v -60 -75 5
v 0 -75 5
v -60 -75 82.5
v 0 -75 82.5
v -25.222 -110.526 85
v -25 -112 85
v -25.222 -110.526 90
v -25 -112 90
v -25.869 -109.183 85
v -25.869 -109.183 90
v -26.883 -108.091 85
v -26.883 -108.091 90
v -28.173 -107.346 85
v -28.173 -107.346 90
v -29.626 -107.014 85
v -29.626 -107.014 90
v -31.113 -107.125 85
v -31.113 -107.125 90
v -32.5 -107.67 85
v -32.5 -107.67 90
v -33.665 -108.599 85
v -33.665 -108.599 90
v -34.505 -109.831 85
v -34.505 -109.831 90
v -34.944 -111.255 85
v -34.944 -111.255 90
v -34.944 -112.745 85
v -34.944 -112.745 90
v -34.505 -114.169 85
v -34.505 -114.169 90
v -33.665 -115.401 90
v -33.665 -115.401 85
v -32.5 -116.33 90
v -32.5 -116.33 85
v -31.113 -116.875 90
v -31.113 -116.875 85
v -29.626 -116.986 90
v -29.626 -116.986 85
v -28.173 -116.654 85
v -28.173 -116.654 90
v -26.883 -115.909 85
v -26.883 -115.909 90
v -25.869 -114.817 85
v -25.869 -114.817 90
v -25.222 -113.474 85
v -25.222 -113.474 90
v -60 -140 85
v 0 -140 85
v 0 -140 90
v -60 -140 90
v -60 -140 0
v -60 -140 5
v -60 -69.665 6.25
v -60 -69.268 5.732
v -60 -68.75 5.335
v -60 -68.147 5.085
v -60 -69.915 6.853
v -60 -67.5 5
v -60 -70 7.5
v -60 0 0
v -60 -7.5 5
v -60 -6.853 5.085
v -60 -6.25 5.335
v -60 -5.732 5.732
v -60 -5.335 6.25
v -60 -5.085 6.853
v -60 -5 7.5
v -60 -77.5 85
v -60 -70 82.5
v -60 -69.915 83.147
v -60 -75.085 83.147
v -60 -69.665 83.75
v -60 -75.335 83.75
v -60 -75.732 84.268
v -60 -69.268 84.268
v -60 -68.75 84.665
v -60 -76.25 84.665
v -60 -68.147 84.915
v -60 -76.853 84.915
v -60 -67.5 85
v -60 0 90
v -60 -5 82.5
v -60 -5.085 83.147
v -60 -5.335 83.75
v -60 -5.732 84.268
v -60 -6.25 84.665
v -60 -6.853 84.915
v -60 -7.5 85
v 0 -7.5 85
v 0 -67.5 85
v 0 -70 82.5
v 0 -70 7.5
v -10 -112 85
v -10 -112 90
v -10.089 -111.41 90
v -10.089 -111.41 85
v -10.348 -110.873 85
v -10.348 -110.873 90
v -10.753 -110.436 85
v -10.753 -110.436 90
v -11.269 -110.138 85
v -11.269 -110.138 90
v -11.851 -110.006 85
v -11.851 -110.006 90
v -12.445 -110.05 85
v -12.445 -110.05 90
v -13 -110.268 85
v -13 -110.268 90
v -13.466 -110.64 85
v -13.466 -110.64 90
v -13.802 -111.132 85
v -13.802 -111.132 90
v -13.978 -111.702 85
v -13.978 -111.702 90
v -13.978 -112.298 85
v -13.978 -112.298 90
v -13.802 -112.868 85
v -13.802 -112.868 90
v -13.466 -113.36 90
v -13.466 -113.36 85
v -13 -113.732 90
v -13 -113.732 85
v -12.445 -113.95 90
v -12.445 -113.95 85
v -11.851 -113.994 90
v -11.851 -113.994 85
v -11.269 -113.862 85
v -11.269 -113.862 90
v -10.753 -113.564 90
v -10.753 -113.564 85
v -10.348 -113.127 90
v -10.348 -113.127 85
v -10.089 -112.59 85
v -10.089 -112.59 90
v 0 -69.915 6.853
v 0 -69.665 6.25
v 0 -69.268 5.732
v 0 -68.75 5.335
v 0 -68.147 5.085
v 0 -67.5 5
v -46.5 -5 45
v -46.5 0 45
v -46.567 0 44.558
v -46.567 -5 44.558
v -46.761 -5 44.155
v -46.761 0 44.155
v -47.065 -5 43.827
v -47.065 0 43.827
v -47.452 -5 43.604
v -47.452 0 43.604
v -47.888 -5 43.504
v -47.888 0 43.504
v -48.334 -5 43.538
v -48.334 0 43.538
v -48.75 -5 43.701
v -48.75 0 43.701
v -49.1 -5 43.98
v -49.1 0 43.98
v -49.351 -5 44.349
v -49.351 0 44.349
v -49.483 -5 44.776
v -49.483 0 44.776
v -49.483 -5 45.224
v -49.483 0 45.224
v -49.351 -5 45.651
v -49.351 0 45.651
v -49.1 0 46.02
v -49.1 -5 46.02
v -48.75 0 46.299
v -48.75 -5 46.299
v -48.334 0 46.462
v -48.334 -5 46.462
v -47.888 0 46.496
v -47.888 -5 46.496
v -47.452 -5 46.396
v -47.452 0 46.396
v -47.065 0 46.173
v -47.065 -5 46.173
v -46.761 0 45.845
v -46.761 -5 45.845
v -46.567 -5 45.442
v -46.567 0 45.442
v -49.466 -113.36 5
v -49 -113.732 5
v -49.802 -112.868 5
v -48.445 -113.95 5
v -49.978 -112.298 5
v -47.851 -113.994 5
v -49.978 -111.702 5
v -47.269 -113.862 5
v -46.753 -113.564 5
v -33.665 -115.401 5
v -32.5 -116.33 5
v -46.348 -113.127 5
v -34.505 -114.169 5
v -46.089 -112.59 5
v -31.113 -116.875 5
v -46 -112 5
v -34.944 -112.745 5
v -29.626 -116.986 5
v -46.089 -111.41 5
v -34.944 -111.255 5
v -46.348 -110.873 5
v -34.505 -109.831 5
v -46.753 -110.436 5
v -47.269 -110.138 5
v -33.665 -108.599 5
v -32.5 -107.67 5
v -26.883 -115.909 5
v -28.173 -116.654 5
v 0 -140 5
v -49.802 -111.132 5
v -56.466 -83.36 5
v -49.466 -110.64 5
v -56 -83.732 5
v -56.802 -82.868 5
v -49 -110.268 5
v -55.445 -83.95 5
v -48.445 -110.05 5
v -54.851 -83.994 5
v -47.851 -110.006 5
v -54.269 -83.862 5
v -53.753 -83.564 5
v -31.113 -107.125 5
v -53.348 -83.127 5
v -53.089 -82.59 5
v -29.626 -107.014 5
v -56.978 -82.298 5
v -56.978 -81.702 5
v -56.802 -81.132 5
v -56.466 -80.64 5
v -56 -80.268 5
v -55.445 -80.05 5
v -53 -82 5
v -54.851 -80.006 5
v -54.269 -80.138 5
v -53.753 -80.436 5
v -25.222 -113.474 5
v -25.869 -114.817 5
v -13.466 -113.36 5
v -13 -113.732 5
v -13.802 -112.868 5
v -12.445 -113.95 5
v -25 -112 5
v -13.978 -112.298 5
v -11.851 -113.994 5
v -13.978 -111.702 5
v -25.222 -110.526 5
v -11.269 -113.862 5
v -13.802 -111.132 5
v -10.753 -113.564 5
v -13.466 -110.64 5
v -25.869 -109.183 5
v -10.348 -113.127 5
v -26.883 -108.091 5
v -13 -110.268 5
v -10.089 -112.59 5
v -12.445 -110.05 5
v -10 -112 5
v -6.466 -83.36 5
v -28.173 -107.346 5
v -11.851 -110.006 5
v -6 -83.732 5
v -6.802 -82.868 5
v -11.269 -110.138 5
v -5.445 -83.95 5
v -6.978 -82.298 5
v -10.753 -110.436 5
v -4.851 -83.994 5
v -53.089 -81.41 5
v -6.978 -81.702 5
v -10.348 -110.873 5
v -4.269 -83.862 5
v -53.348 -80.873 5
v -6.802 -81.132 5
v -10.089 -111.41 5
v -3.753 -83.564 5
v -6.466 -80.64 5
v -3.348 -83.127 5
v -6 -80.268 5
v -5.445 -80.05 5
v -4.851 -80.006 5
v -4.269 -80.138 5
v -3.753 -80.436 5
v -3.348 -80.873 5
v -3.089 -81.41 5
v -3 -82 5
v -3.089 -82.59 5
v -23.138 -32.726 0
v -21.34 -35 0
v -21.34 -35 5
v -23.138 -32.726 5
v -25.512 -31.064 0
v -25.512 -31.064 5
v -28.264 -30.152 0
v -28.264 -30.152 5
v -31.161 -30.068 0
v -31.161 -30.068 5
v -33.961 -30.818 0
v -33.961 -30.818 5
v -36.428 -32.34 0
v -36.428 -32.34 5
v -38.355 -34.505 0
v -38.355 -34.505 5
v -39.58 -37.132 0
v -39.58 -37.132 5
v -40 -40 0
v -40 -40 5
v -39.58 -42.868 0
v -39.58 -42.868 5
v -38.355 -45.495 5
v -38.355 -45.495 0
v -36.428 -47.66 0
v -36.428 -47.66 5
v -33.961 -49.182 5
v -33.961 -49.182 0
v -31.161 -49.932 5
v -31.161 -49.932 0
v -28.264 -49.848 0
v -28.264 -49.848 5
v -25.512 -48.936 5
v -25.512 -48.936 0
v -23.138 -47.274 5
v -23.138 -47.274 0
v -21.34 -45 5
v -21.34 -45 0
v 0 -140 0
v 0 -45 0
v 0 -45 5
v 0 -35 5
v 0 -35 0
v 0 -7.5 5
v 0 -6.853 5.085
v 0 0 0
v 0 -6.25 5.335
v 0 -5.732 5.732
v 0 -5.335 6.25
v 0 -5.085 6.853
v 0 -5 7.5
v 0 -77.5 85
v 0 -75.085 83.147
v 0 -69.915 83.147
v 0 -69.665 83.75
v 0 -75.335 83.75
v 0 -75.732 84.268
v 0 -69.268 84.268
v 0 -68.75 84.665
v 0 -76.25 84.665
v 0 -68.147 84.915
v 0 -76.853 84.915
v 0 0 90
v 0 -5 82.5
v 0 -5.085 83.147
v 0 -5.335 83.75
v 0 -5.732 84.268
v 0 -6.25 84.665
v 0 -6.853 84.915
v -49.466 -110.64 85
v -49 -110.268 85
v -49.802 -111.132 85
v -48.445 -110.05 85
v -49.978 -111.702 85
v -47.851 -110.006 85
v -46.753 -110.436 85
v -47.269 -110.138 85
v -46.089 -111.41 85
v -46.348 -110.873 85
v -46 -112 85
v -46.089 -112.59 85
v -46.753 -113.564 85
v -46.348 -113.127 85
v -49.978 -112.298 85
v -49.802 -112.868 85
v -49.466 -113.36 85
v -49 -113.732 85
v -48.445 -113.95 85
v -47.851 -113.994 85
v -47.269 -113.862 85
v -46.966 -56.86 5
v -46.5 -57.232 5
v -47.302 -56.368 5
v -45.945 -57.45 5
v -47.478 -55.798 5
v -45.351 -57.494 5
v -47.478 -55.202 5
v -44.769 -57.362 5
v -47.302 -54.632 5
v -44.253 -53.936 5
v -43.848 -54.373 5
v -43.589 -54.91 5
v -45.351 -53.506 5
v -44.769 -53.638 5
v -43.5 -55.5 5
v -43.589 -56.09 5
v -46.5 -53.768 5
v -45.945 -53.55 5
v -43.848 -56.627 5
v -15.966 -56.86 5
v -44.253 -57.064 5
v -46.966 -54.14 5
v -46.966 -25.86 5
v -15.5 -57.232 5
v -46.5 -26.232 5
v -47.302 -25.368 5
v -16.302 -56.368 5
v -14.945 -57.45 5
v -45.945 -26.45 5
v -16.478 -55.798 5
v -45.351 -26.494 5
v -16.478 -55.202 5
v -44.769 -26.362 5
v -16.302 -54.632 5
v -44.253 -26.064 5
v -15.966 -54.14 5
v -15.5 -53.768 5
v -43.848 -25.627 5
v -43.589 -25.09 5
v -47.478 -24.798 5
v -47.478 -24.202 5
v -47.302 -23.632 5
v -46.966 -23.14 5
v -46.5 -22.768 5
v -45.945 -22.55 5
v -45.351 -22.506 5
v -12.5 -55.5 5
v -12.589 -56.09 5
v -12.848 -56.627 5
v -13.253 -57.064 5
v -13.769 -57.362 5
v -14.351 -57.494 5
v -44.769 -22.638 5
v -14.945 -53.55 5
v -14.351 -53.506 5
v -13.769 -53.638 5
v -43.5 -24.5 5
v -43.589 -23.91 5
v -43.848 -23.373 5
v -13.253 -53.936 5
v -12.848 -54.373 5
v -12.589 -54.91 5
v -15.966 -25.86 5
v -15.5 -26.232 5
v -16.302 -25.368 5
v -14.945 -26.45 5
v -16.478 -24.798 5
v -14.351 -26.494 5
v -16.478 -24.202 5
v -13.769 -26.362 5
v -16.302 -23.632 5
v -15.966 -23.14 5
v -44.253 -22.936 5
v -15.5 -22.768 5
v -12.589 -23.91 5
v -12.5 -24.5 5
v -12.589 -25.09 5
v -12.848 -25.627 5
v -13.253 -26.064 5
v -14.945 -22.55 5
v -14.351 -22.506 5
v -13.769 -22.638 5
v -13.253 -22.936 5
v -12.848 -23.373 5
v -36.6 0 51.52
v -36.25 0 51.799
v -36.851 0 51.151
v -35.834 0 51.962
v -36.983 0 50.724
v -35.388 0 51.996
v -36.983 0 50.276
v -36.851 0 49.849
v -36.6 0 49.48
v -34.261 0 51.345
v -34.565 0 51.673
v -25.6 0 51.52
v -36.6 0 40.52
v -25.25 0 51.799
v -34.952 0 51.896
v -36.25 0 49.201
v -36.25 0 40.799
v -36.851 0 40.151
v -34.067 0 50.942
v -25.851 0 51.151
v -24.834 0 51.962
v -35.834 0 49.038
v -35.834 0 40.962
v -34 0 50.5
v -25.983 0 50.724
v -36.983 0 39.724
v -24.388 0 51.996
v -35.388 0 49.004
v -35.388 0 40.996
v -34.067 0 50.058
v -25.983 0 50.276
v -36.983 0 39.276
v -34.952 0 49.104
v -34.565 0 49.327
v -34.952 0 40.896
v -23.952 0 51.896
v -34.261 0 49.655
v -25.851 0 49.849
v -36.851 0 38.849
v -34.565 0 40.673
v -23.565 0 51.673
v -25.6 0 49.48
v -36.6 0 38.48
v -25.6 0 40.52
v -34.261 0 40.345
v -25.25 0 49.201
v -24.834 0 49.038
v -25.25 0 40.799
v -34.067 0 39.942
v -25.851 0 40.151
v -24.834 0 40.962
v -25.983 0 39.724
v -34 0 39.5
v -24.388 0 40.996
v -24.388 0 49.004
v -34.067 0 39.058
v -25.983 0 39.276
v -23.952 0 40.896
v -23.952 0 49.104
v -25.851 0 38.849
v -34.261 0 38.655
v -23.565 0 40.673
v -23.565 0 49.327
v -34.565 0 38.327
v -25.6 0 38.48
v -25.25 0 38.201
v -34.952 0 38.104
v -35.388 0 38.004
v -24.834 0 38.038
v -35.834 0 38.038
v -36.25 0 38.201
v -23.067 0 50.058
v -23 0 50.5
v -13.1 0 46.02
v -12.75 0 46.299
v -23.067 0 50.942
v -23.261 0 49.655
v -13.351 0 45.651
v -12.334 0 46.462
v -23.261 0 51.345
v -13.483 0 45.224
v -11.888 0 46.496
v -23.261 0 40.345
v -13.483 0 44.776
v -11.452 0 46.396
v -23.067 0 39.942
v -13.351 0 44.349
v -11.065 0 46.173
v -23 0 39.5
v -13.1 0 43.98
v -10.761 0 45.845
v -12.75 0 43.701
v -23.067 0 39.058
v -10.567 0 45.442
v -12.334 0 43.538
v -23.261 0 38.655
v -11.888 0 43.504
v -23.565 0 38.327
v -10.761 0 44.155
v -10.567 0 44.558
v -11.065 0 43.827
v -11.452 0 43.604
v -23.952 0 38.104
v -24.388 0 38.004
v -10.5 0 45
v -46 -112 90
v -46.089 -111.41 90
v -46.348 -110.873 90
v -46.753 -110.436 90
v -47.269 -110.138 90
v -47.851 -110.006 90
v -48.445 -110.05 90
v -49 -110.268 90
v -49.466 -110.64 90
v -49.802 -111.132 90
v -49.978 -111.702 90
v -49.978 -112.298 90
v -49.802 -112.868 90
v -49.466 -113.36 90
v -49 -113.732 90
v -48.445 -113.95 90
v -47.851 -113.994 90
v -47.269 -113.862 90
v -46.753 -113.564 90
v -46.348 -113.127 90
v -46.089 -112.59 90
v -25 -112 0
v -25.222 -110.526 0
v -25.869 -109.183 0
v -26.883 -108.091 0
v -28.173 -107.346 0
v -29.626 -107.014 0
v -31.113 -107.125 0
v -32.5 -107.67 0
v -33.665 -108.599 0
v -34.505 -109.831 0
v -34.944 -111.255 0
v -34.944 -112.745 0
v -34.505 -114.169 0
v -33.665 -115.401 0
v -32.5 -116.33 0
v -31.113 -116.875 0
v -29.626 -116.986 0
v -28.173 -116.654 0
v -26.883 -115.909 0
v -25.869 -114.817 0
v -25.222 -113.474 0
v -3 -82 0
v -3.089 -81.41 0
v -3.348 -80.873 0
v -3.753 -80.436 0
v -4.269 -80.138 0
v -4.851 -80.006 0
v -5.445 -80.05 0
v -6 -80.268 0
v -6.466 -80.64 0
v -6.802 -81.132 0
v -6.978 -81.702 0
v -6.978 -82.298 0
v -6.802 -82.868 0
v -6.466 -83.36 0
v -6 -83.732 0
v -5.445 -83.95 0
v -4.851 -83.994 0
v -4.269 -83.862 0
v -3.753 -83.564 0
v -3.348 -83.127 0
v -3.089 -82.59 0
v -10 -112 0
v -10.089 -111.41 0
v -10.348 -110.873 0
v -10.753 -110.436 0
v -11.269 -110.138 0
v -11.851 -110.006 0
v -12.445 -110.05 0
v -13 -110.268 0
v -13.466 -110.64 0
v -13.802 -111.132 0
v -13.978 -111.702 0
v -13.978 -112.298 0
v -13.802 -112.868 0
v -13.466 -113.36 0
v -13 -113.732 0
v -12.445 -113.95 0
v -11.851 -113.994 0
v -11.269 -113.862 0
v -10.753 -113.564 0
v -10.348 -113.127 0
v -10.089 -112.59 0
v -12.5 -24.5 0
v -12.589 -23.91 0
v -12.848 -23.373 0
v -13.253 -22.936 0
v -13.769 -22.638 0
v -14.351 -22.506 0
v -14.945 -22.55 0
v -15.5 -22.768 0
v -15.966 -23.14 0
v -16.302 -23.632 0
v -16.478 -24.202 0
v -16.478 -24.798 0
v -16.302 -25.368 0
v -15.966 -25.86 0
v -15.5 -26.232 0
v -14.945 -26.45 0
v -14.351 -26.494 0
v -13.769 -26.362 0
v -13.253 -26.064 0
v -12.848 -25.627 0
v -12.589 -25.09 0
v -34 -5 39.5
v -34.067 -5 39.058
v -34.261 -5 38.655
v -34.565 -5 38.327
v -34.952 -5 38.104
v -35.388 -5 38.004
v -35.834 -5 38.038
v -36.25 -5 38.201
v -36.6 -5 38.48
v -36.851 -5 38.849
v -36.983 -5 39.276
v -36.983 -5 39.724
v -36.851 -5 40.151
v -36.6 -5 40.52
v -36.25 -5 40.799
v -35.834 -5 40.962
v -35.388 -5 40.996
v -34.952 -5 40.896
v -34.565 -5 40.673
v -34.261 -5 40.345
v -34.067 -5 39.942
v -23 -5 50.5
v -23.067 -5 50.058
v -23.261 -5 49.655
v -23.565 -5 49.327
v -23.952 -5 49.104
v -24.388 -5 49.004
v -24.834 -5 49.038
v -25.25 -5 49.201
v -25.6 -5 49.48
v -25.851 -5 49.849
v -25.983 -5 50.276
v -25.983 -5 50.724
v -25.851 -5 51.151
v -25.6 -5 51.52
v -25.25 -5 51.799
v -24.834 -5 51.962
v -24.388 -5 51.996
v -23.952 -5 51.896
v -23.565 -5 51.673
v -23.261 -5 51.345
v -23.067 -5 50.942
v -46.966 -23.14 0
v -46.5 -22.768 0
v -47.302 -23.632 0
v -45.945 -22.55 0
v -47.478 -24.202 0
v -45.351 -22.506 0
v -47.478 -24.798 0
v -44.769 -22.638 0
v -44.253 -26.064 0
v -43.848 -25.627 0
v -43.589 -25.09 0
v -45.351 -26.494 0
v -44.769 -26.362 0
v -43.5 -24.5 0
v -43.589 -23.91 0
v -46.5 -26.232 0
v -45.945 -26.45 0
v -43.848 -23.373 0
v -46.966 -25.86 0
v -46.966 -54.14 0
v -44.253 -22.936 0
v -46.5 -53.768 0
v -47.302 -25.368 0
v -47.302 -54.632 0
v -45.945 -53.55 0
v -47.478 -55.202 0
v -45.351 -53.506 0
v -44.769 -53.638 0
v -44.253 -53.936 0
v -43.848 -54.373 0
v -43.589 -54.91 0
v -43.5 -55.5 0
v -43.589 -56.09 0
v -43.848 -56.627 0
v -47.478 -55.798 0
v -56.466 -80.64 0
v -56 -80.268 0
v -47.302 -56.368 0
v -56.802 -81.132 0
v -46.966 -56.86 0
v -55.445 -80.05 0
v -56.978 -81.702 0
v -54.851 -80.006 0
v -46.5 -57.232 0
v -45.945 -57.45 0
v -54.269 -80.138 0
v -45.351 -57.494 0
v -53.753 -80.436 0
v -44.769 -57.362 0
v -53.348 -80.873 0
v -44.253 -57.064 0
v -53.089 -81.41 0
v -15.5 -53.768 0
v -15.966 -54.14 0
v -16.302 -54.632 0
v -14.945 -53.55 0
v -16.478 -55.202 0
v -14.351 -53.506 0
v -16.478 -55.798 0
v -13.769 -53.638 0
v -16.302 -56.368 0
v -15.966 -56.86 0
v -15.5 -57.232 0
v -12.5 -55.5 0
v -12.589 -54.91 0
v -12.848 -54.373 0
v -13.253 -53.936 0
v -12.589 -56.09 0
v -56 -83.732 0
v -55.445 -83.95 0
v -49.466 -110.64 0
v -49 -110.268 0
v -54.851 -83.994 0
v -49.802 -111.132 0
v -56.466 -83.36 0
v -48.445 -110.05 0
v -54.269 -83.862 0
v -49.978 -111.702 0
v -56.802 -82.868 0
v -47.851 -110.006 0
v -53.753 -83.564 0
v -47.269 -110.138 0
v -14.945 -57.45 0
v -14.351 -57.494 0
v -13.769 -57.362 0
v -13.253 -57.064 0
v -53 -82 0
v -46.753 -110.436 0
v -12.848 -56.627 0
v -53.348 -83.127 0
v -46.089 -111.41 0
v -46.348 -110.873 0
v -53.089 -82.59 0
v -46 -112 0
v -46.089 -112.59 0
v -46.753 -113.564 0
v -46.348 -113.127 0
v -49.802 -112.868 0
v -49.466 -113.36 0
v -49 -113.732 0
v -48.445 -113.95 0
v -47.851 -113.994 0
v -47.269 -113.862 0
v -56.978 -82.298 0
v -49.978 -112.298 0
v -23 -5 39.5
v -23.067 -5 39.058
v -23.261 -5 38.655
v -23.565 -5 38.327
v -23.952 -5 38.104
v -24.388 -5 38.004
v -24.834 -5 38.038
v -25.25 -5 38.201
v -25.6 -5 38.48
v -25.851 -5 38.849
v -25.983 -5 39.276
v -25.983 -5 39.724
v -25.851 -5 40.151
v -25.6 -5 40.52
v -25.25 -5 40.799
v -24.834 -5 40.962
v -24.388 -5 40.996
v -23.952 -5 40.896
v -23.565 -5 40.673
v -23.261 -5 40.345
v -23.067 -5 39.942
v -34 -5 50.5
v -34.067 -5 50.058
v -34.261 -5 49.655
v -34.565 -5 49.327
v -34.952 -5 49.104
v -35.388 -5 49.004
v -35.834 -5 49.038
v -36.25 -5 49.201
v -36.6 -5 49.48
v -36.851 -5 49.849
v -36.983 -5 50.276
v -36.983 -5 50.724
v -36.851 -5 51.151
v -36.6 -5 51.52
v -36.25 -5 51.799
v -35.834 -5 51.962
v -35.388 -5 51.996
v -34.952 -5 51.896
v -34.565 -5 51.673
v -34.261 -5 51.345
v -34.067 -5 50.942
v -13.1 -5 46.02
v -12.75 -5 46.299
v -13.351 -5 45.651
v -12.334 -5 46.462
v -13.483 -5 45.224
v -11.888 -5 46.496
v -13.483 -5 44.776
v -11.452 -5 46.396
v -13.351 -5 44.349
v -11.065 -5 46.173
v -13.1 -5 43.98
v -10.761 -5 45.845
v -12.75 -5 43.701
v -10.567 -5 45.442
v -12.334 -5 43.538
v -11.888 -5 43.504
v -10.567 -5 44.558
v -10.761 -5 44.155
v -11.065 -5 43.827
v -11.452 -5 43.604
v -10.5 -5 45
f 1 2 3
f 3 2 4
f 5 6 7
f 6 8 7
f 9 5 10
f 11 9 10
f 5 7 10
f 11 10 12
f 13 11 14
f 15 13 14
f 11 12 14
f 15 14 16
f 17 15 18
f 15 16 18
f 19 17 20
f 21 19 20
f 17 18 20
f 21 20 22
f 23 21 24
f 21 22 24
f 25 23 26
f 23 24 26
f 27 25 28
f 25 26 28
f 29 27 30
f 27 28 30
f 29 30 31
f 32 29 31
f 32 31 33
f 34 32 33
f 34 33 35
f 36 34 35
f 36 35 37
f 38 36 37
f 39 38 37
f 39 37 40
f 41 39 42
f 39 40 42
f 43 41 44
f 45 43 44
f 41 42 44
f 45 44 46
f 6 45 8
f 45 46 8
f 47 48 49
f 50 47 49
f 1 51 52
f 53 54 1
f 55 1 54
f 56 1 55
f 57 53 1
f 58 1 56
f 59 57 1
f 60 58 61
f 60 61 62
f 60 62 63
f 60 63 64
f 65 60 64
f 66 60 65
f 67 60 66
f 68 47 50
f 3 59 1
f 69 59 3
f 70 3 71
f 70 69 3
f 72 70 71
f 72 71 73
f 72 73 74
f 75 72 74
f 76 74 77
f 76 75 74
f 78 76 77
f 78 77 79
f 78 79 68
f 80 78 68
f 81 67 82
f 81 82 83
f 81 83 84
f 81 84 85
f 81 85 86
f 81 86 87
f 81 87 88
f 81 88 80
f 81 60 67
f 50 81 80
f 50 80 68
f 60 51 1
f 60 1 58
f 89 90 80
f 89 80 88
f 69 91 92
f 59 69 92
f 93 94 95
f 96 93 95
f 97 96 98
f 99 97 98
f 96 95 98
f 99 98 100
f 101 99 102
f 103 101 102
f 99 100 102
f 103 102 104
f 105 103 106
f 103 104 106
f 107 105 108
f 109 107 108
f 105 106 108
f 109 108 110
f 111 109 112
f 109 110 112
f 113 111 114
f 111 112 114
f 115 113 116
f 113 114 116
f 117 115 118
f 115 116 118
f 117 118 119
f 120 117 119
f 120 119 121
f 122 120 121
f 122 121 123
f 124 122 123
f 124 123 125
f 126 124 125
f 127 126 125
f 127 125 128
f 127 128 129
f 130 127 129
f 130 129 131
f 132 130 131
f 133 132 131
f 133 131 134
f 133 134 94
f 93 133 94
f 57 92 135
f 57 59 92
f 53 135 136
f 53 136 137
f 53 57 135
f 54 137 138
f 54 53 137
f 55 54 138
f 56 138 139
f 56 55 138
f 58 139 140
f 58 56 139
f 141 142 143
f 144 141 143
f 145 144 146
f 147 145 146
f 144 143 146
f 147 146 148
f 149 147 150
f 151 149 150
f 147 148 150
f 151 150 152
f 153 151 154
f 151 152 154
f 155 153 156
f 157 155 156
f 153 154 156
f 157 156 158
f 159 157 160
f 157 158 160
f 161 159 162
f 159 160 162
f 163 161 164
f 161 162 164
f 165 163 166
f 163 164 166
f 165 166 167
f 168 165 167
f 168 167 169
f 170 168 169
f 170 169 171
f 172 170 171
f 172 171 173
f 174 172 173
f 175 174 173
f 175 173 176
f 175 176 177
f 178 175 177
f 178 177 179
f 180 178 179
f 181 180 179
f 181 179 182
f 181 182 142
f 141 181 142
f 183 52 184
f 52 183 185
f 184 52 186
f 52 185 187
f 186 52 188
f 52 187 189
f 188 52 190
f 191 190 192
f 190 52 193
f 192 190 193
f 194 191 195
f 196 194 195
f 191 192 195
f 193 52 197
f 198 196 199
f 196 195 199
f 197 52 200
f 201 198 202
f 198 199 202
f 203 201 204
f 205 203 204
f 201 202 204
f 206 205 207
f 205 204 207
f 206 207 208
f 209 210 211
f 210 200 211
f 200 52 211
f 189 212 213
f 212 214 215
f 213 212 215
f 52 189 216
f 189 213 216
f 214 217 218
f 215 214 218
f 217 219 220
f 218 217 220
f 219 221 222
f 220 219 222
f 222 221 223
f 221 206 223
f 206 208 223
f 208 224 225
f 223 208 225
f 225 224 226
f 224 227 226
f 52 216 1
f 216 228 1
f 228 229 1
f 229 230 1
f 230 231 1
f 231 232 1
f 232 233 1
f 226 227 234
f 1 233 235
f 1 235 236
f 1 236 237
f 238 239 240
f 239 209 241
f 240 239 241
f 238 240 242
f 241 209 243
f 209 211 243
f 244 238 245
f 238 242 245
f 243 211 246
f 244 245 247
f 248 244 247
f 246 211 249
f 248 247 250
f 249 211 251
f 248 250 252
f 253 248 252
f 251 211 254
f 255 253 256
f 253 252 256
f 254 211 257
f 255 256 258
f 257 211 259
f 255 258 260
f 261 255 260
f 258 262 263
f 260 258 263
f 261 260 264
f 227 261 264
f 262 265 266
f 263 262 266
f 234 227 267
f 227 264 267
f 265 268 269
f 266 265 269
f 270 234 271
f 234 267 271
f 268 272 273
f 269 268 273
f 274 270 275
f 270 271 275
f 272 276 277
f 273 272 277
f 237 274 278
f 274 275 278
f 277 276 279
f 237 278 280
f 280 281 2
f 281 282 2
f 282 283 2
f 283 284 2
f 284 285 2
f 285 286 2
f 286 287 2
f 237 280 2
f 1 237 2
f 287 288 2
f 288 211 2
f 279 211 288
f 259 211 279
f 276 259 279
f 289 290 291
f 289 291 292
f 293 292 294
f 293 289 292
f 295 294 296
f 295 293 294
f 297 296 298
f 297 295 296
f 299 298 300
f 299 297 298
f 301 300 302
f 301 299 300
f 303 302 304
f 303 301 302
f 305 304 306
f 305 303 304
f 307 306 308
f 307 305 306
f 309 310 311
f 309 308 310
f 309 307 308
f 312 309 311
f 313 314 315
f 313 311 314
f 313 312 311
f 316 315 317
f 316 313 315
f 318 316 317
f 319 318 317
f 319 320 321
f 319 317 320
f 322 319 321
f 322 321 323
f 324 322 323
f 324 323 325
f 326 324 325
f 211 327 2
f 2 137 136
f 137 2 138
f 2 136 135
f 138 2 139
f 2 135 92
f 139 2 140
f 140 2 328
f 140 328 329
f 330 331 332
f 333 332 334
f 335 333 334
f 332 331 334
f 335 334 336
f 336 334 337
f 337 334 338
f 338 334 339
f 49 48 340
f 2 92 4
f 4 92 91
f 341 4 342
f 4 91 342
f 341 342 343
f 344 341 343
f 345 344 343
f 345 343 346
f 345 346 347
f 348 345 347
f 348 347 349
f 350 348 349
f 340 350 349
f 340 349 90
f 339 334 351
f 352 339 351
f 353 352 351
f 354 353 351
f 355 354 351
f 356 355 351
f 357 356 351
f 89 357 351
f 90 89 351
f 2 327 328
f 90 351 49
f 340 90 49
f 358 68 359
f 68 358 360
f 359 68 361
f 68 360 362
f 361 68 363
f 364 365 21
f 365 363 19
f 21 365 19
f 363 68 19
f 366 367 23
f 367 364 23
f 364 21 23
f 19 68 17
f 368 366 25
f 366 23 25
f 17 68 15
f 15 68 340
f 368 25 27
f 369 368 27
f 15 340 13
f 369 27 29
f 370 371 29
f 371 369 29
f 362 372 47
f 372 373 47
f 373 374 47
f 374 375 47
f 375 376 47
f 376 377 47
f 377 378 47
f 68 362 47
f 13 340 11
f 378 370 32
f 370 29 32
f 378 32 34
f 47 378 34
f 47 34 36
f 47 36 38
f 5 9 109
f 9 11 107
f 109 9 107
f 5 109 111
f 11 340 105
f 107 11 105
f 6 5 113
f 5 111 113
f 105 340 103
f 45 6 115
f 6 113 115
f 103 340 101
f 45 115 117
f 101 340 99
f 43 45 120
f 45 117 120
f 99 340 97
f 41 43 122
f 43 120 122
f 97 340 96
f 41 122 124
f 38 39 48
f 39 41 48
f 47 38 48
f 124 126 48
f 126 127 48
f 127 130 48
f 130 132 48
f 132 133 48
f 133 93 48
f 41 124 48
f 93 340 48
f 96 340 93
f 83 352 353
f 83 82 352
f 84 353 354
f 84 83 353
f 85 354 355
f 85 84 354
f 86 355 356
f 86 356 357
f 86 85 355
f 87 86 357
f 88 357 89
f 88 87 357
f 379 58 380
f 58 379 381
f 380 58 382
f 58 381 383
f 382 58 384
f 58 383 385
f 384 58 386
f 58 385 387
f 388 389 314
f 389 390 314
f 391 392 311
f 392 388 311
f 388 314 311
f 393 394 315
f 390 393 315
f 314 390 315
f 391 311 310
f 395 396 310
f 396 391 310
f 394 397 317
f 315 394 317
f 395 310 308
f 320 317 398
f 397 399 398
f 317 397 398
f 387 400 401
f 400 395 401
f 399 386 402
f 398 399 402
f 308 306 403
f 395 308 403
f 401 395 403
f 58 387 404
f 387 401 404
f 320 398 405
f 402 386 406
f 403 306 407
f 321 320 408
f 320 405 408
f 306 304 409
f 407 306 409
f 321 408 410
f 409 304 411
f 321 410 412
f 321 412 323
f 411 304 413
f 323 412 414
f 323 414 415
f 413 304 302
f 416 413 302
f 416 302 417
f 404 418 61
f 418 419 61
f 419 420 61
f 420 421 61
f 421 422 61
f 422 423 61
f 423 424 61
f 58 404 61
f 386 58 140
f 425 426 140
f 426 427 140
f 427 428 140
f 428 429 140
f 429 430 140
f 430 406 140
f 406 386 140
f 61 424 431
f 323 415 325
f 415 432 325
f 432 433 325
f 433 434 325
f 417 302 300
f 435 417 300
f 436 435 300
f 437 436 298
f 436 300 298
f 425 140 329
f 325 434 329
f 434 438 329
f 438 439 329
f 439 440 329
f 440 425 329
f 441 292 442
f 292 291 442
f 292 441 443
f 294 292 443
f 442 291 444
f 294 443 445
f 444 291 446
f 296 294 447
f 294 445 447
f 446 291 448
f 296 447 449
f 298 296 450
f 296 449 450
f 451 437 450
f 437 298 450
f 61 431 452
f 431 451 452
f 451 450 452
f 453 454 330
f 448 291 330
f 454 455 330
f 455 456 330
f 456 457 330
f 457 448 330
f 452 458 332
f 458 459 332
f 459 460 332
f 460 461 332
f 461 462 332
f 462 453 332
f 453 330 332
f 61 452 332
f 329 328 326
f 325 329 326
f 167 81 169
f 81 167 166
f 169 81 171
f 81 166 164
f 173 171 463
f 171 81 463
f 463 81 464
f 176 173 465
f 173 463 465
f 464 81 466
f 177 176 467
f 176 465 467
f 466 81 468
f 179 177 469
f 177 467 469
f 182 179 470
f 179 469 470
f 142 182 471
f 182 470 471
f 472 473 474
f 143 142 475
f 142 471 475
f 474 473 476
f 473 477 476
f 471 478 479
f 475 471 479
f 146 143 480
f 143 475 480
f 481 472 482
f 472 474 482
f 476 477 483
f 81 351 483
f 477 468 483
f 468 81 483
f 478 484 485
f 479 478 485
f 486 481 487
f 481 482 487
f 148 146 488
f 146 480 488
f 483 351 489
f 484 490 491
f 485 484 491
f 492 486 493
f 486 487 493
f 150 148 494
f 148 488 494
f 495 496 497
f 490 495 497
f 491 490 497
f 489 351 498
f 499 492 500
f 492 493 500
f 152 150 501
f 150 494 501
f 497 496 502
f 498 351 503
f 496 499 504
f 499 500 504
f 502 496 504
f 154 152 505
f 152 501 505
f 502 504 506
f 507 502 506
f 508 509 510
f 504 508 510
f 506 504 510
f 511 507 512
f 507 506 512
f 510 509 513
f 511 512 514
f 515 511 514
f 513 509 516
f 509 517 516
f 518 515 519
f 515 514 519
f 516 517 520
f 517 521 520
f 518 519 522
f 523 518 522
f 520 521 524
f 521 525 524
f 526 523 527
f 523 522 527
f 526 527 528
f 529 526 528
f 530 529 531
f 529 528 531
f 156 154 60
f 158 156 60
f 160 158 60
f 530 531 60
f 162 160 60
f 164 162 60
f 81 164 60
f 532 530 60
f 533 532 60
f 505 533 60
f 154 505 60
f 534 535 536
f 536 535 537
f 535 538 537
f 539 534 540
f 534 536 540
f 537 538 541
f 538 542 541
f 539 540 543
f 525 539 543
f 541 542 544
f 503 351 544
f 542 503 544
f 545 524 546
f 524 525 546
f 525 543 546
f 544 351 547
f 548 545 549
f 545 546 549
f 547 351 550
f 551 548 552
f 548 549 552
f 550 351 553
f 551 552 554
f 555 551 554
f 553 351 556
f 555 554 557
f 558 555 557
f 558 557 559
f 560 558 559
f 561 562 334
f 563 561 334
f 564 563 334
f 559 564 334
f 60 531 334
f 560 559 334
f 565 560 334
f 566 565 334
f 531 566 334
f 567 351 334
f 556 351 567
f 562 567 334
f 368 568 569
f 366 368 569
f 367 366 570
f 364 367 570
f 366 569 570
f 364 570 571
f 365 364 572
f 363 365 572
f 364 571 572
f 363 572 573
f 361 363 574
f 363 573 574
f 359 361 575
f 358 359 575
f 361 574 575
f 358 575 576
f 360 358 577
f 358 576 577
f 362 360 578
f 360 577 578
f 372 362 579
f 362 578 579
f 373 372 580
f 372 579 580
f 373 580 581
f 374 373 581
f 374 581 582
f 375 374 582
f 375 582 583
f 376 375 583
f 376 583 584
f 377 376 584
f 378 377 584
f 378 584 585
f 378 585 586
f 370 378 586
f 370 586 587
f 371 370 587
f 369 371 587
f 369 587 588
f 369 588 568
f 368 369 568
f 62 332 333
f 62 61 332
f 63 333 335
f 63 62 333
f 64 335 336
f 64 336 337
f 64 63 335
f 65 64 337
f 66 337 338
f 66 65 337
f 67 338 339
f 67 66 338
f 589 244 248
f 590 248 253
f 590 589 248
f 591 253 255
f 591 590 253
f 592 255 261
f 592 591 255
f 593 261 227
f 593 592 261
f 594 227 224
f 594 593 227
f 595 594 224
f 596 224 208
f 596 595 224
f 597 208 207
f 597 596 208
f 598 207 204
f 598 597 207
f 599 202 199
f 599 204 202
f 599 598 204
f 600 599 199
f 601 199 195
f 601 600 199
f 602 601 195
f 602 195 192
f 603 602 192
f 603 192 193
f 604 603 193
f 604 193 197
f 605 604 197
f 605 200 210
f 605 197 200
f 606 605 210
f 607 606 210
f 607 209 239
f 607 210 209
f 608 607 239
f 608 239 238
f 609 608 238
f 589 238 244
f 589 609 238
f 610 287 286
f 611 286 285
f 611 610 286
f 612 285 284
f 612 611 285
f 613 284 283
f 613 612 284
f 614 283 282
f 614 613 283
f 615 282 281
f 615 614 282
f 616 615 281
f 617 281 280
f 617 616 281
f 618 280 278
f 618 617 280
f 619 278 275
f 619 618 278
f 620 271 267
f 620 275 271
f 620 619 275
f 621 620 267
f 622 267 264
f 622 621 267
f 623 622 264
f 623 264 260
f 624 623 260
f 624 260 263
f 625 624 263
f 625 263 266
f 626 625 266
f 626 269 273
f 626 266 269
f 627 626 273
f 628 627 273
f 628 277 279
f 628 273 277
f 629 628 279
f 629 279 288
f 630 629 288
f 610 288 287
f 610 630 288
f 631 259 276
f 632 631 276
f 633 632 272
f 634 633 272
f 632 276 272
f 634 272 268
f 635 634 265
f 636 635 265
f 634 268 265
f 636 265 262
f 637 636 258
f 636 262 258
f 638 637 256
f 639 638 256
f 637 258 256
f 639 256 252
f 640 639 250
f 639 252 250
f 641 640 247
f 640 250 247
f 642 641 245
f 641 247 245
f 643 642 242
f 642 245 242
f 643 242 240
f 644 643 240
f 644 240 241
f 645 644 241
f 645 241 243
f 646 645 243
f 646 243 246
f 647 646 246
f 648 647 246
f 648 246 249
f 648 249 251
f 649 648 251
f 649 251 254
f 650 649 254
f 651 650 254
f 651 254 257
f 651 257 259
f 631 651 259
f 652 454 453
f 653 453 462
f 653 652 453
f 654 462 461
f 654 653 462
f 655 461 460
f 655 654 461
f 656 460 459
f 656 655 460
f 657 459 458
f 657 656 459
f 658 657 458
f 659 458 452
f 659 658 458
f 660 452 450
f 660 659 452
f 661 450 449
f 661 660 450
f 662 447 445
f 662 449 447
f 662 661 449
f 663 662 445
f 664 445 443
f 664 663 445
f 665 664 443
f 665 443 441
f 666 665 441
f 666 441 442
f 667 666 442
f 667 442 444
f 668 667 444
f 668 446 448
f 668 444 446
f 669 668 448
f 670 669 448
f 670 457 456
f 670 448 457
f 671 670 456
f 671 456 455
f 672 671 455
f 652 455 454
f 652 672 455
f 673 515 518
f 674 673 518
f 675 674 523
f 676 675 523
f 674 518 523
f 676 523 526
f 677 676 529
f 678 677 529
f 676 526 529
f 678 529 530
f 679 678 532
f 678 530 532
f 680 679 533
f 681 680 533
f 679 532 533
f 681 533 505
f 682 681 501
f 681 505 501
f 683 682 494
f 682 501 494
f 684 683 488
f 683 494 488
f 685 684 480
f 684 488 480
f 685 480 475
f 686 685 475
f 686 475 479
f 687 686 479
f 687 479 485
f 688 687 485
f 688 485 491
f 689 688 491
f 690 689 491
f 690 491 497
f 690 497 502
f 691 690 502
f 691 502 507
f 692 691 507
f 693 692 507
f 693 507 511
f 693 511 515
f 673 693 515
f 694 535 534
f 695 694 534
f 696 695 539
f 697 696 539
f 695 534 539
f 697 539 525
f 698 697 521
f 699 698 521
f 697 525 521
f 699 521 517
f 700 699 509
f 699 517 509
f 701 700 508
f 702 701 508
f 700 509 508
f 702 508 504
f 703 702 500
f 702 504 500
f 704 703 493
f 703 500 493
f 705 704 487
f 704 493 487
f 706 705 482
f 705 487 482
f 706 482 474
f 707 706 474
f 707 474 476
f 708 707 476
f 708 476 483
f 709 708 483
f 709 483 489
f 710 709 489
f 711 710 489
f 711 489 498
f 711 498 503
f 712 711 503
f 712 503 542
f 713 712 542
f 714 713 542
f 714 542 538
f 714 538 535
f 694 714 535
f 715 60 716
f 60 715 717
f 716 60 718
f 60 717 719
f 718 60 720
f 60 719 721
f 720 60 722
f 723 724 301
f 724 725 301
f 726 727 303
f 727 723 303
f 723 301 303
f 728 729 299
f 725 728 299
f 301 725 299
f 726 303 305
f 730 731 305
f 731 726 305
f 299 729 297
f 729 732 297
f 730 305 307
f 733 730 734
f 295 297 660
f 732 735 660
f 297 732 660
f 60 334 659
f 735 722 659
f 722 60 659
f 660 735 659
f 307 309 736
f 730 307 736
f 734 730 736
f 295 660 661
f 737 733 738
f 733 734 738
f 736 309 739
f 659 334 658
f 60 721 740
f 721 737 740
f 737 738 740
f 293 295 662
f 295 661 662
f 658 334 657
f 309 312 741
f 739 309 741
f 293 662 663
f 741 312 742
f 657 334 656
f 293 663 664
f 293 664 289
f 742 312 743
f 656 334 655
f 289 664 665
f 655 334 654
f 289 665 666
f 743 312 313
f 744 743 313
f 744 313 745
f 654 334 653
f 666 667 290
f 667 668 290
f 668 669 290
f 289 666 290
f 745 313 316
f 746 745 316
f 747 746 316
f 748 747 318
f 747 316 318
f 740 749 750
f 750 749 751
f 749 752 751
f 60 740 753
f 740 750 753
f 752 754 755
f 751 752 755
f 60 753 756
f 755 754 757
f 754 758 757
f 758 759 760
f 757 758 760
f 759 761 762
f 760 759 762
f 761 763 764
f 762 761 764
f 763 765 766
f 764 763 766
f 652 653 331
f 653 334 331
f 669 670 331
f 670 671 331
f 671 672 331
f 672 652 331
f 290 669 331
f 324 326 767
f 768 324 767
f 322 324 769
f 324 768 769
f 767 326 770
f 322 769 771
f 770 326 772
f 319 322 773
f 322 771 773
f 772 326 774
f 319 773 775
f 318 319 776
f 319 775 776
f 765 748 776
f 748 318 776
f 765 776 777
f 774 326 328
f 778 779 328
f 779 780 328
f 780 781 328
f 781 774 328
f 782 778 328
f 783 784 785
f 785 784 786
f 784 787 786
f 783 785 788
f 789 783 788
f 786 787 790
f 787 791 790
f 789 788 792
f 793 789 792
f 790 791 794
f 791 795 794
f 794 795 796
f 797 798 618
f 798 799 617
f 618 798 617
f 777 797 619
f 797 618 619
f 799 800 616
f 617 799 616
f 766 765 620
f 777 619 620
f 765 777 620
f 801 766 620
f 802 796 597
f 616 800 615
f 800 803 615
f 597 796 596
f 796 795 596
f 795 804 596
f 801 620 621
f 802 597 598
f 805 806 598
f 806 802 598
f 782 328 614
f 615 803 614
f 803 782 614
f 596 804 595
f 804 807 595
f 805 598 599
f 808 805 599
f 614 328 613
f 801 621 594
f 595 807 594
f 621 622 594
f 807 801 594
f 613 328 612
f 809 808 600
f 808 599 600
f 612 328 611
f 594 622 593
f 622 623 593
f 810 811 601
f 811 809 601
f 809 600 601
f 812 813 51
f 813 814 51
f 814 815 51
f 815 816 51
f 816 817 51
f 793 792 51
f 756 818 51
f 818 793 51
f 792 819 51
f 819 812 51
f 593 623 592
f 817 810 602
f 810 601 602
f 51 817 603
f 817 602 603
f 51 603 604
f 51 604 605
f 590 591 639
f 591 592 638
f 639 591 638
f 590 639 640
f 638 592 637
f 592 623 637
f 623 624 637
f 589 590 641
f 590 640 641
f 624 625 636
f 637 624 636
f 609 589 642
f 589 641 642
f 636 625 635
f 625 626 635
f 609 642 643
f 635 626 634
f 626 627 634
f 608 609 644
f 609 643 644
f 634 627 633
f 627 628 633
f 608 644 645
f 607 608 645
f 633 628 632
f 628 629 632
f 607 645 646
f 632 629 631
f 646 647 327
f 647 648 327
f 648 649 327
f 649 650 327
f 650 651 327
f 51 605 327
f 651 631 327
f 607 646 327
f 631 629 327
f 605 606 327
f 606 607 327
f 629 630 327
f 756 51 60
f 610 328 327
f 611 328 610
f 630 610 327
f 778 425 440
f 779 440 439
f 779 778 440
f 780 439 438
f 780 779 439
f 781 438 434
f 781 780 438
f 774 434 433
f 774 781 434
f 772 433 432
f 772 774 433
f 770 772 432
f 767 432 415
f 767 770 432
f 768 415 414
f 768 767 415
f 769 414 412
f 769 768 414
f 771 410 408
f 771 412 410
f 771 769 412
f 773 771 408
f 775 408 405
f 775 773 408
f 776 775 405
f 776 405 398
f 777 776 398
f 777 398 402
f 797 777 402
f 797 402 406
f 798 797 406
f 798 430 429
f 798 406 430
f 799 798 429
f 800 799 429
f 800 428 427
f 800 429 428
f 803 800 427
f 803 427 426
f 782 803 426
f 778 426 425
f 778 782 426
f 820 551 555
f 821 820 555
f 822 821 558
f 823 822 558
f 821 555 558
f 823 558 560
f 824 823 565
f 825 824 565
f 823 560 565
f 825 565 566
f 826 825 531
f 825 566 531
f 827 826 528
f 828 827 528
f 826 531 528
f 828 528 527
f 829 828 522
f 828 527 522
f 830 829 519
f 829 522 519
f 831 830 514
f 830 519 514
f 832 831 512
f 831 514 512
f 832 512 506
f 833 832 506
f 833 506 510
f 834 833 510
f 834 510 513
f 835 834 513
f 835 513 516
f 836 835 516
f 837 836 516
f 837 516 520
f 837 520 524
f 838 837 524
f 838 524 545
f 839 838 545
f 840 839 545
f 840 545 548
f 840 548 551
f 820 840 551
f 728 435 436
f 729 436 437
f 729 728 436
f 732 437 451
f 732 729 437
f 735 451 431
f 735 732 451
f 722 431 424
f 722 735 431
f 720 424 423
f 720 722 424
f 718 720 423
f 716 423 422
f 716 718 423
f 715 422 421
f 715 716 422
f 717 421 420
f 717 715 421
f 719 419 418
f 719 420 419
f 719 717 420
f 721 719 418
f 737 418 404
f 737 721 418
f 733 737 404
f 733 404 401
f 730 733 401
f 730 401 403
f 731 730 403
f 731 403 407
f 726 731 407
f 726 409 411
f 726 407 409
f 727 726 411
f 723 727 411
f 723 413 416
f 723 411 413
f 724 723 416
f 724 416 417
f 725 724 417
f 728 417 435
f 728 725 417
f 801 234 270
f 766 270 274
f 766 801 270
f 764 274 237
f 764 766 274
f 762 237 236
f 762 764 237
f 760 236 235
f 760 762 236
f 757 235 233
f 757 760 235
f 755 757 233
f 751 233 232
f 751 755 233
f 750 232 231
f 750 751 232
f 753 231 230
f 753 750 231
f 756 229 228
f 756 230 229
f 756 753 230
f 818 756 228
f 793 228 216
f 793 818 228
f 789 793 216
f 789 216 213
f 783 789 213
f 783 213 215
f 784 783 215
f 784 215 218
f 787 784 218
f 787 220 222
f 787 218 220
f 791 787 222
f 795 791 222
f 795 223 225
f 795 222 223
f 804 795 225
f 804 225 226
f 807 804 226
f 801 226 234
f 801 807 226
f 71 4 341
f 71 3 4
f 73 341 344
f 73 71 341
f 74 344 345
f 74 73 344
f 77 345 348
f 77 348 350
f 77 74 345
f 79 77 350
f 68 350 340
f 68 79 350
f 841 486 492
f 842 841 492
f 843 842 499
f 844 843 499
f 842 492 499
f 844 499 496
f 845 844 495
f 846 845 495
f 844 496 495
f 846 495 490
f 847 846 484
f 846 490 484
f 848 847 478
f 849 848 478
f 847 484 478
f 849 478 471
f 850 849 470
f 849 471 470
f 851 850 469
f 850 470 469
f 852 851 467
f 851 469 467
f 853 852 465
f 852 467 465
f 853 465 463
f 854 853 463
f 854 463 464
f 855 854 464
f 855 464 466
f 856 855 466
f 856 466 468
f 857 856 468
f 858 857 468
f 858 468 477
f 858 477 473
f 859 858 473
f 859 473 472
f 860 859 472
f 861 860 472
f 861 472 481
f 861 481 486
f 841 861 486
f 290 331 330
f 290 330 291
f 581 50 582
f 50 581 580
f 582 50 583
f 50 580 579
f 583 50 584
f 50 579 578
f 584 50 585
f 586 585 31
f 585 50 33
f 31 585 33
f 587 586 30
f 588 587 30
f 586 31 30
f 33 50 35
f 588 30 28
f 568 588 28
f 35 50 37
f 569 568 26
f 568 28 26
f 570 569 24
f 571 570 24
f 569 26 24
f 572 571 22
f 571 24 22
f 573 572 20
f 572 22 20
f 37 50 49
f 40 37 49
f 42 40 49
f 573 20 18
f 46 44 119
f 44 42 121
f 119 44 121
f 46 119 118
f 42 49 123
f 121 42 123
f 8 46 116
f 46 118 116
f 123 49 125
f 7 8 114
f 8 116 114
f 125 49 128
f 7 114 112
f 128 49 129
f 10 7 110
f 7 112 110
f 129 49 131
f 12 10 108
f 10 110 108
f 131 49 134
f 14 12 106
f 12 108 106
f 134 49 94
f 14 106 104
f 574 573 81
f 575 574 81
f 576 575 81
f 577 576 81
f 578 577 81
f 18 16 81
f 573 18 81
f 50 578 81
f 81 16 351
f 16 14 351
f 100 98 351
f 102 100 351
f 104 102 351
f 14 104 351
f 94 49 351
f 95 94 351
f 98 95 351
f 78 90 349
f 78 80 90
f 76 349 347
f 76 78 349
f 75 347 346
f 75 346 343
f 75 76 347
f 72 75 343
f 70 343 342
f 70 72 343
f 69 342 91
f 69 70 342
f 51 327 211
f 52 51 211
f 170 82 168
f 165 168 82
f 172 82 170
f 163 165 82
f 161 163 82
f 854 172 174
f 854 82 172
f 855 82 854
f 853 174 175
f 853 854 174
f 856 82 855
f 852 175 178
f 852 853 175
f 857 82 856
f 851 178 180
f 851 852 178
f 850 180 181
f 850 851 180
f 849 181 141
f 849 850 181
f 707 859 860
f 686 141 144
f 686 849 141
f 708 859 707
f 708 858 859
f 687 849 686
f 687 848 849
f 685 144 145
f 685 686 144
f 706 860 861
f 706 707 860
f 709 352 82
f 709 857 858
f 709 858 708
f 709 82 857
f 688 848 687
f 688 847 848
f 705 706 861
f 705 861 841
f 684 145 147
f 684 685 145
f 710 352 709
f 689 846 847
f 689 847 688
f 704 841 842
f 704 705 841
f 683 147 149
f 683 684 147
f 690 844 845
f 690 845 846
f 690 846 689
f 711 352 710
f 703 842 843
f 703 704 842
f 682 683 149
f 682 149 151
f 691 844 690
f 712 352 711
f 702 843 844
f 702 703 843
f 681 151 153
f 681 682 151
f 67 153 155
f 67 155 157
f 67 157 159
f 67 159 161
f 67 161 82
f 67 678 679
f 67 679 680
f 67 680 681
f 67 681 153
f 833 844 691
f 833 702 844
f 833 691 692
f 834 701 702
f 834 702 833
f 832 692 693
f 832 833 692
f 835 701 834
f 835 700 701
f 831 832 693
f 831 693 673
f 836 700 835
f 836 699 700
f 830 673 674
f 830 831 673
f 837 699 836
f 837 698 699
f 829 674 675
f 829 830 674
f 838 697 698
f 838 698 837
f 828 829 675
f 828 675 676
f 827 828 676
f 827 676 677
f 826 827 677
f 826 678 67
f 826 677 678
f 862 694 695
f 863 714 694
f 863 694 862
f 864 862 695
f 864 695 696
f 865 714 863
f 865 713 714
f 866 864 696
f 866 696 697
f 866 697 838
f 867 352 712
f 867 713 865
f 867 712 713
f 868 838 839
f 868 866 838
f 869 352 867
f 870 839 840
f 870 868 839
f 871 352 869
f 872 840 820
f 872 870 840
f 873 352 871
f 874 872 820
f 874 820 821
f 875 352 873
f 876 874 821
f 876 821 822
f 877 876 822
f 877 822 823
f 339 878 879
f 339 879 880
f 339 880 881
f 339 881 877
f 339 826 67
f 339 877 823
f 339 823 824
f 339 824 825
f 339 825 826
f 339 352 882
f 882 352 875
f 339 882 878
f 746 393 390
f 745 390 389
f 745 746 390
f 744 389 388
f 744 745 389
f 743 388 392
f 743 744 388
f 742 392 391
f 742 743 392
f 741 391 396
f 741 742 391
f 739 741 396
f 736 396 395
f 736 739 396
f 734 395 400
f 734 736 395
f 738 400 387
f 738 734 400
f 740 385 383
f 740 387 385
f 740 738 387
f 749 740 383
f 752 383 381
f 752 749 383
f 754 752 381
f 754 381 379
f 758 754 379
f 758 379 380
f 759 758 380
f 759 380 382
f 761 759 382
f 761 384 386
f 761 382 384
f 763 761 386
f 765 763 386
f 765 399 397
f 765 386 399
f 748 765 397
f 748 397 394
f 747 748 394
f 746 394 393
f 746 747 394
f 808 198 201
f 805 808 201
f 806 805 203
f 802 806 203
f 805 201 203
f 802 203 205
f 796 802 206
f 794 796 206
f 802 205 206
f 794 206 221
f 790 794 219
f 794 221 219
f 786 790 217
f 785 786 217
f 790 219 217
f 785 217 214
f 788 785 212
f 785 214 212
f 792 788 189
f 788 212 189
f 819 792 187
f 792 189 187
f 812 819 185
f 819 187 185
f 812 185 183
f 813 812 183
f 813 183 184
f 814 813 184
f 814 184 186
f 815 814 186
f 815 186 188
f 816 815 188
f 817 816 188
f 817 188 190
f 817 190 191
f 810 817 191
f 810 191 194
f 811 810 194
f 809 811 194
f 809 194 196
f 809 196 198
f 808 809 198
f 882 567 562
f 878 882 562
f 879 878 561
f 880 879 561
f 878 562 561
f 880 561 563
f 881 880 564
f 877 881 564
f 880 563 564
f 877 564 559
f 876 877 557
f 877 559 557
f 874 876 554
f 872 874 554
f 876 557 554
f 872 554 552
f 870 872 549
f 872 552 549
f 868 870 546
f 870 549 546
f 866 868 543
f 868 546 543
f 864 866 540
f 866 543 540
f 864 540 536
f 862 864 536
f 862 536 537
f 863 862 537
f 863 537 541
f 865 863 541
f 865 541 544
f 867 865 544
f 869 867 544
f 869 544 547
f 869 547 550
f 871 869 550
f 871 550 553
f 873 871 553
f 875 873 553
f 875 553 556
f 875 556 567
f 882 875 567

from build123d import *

# Parameters (mm, degrees)
BOSS_EXTRUDE1_DEPTH = 60
SKETCH2_W           = 80
SKETCH2_H           = 65
CUT_EXTRUDE1_DEPTH  = 60
CUT_EXTRUDE2_REACH  = 142
SKETCH3_R           = 1.5
CUT_EXTRUDE3_REACH  = 92
SKETCH4_R           = 5
SKETCH4_R_2         = 10
SKETCH4_R_3         = 2
FILLET1_R           = 2.5
FILLET3_R           = 2.5
FILLET4_R           = 2.5
FILLET5_R           = 2.5
FILLET6_R           = 2.5
SKETCH5_R           = 5
SKETCH5_R_2         = 2
CUT_EXTRUDE4_DEPTH  = 91
CUT_EXTRUDE5_REACH  = 92
SKETCH6_W           = 30
SKETCH6_H           = 10


with BuildPart() as part:
    # Sketch1 → Boss-Extrude1 (new body)
    with BuildSketch(Plane(origin=(0, 0, 0), x_dir=(0, 0, -1), z_dir=(1, 0, 0))):
        Polygon((0, 0), (0, -140), (-5, -140), (-5, -75), (-85, -75), (-85, -140), (-90, -140), (-90, 0), align=None)
    extrude(amount=-BOSS_EXTRUDE1_DEPTH)

    # Sketch2 → Cut-Extrude1 (cut)
    with BuildSketch(Plane(origin=(0, 0, 0), x_dir=(0, 0, -1), z_dir=(1, 0, 0))):
        with Locations((-45, -37.5)):
            Rectangle(SKETCH2_W, SKETCH2_H)
    extrude(amount=-CUT_EXTRUDE1_DEPTH, mode=Mode.SUBTRACT)

    # Sketch3 → Cut-Extrude2 (cut, up to next)
    with BuildSketch(Plane(origin=(0, 0, 0), x_dir=(1, 0, 0), z_dir=(0, 1, 0)), mode=Mode.PRIVATE) as cut_extrude2_sk1:
        with Locations((-24.5, -50.5)):
            Circle(SKETCH3_R)
    cut_extrude2_tool1 = extrude(cut_extrude2_sk1.sketch, amount=-CUT_EXTRUDE2_REACH, mode=Mode.PRIVATE) & part.part
    add(cut_extrude2_tool1.solids().sort_by_distance((-24.5, 0, 50.5))[0], mode=Mode.SUBTRACT)
    # Sketch3 → Cut-Extrude2 (cut, up to next)
    with BuildSketch(Plane(origin=(0, 0, 0), x_dir=(1, 0, 0), z_dir=(0, 1, 0)), mode=Mode.PRIVATE) as cut_extrude2_sk2:
        with Locations((-35.5, -50.5)):
            Circle(SKETCH3_R)
    cut_extrude2_tool2 = extrude(cut_extrude2_sk2.sketch, amount=-CUT_EXTRUDE2_REACH, mode=Mode.PRIVATE) & part.part
    add(cut_extrude2_tool2.solids().sort_by_distance((-35.5, 0, 50.5))[0], mode=Mode.SUBTRACT)
    # Sketch3 → Cut-Extrude2 (cut, up to next)
    with BuildSketch(Plane(origin=(0, 0, 0), x_dir=(1, 0, 0), z_dir=(0, 1, 0)), mode=Mode.PRIVATE) as cut_extrude2_sk3:
        with Locations((-35.5, -39.5)):
            Circle(SKETCH3_R)
    cut_extrude2_tool3 = extrude(cut_extrude2_sk3.sketch, amount=-CUT_EXTRUDE2_REACH, mode=Mode.PRIVATE) & part.part
    add(cut_extrude2_tool3.solids().sort_by_distance((-35.5, 0, 39.5))[0], mode=Mode.SUBTRACT)
    # Sketch3 → Cut-Extrude2 (cut, up to next)
    with BuildSketch(Plane(origin=(0, 0, 0), x_dir=(1, 0, 0), z_dir=(0, 1, 0)), mode=Mode.PRIVATE) as cut_extrude2_sk4:
        with Locations((-24.5, -39.5)):
            Circle(SKETCH3_R)
    cut_extrude2_tool4 = extrude(cut_extrude2_sk4.sketch, amount=-CUT_EXTRUDE2_REACH, mode=Mode.PRIVATE) & part.part
    add(cut_extrude2_tool4.solids().sort_by_distance((-24.5, 0, 39.5))[0], mode=Mode.SUBTRACT)
    # Sketch3 → Cut-Extrude2 (cut, up to next)
    with BuildSketch(Plane(origin=(0, 0, 0), x_dir=(1, 0, 0), z_dir=(0, 1, 0)), mode=Mode.PRIVATE) as cut_extrude2_sk5:
        with Locations((-12, -45)):
            Circle(SKETCH3_R)
    cut_extrude2_tool5 = extrude(cut_extrude2_sk5.sketch, amount=-CUT_EXTRUDE2_REACH, mode=Mode.PRIVATE) & part.part
    add(cut_extrude2_tool5.solids().sort_by_distance((-12, 0, 45))[0], mode=Mode.SUBTRACT)
    # Sketch3 → Cut-Extrude2 (cut, up to next)
    with BuildSketch(Plane(origin=(0, 0, 0), x_dir=(1, 0, 0), z_dir=(0, 1, 0)), mode=Mode.PRIVATE) as cut_extrude2_sk6:
        with Locations((-48, -45)):
            Circle(SKETCH3_R)
    cut_extrude2_tool6 = extrude(cut_extrude2_sk6.sketch, amount=-CUT_EXTRUDE2_REACH, mode=Mode.PRIVATE) & part.part
    add(cut_extrude2_tool6.solids().sort_by_distance((-48, 0, 45))[0], mode=Mode.SUBTRACT)

    # Sketch4 → Cut-Extrude3 (cut, up to next)
    with BuildSketch(Plane.XY, mode=Mode.PRIVATE) as cut_extrude3_sk1:
        with Locations((-30, -112)):
            Circle(SKETCH4_R)
    cut_extrude3_tool1 = extrude(cut_extrude3_sk1.sketch, amount=CUT_EXTRUDE3_REACH, mode=Mode.PRIVATE) & part.part
    add(cut_extrude3_tool1.solids().sort_by_distance((-30, -112, 0))[0], mode=Mode.SUBTRACT)
    # Sketch4 → Cut-Extrude3 (cut, up to next)
    with BuildSketch(Plane.XY, mode=Mode.PRIVATE) as cut_extrude3_sk2:
        with Locations((-30, -40)):
            Circle(SKETCH4_R_2)
    cut_extrude3_tool2 = extrude(cut_extrude3_sk2.sketch, amount=CUT_EXTRUDE3_REACH, mode=Mode.PRIVATE) & part.part
    add(cut_extrude3_tool2.solids().sort_by_distance((-30, -40, 0))[0], mode=Mode.SUBTRACT)
    # Sketch4 → Cut-Extrude3 (cut, up to next)
    with BuildSketch(Plane.XY, mode=Mode.PRIVATE) as cut_extrude3_sk3:
        with Locations((-5, -82)):
            Circle(SKETCH4_R_3)
    cut_extrude3_tool3 = extrude(cut_extrude3_sk3.sketch, amount=CUT_EXTRUDE3_REACH, mode=Mode.PRIVATE) & part.part
    add(cut_extrude3_tool3.solids().sort_by_distance((-5, -82, 0))[0], mode=Mode.SUBTRACT)
    # Sketch4 → Cut-Extrude3 (cut, up to next)
    with BuildSketch(Plane.XY, mode=Mode.PRIVATE) as cut_extrude3_sk4:
        with Locations((-55, -82)):
            Circle(SKETCH4_R_3)
    cut_extrude3_tool4 = extrude(cut_extrude3_sk4.sketch, amount=CUT_EXTRUDE3_REACH, mode=Mode.PRIVATE) & part.part
    add(cut_extrude3_tool4.solids().sort_by_distance((-55, -82, 0))[0], mode=Mode.SUBTRACT)
    # Sketch4 → Cut-Extrude3 (cut, up to next)
    with BuildSketch(Plane.XY, mode=Mode.PRIVATE) as cut_extrude3_sk5:
        with Locations((-14.5, -24.5)):
            Circle(SKETCH4_R_3)
    cut_extrude3_tool5 = extrude(cut_extrude3_sk5.sketch, amount=CUT_EXTRUDE3_REACH, mode=Mode.PRIVATE) & part.part
    add(cut_extrude3_tool5.solids().sort_by_distance((-14.5, -24.5, 0))[0], mode=Mode.SUBTRACT)
    # Sketch4 → Cut-Extrude3 (cut, up to next)
    with BuildSketch(Plane.XY, mode=Mode.PRIVATE) as cut_extrude3_sk6:
        with Locations((-45.5, -24.5)):
            Circle(SKETCH4_R_3)
    cut_extrude3_tool6 = extrude(cut_extrude3_sk6.sketch, amount=CUT_EXTRUDE3_REACH, mode=Mode.PRIVATE) & part.part
    add(cut_extrude3_tool6.solids().sort_by_distance((-45.5, -24.5, 0))[0], mode=Mode.SUBTRACT)
    # Sketch4 → Cut-Extrude3 (cut, up to next)
    with BuildSketch(Plane.XY, mode=Mode.PRIVATE) as cut_extrude3_sk7:
        with Locations((-45.5, -55.5)):
            Circle(SKETCH4_R_3)
    cut_extrude3_tool7 = extrude(cut_extrude3_sk7.sketch, amount=CUT_EXTRUDE3_REACH, mode=Mode.PRIVATE) & part.part
    add(cut_extrude3_tool7.solids().sort_by_distance((-45.5, -55.5, 0))[0], mode=Mode.SUBTRACT)
    # Sketch4 → Cut-Extrude3 (cut, up to next)
    with BuildSketch(Plane.XY, mode=Mode.PRIVATE) as cut_extrude3_sk8:
        with Locations((-14.5, -55.5)):
            Circle(SKETCH4_R_3)
    cut_extrude3_tool8 = extrude(cut_extrude3_sk8.sketch, amount=CUT_EXTRUDE3_REACH, mode=Mode.PRIVATE) & part.part
    add(cut_extrude3_tool8.solids().sort_by_distance((-14.5, -55.5, 0))[0], mode=Mode.SUBTRACT)

    # Fillet1
    fillet1_edges = [part.edges().sort_by_distance(p)[0] for p in [
        (-30, -75, 85),
    ]]
    fillet(fillet1_edges, radius=FILLET1_R)

    # Fillet3
    fillet3_edges = [part.edges().sort_by_distance(p)[0] for p in [
        (-30, -70, 85),
    ]]
    fillet(fillet3_edges, radius=FILLET3_R)

    # Fillet4
    fillet4_edges = [part.edges().sort_by_distance(p)[0] for p in [
        (-30, -70, 5),
    ]]
    fillet(fillet4_edges, radius=FILLET4_R)

    # Fillet5
    fillet5_edges = [part.edges().sort_by_distance(p)[0] for p in [
        (-30, -5, 5),
    ]]
    fillet(fillet5_edges, radius=FILLET5_R)

    # Fillet6
    fillet6_edges = [part.edges().sort_by_distance(p)[0] for p in [
        (-30, -5, 85),
    ]]
    fillet(fillet6_edges, radius=FILLET6_R)

    # Sketch5 → Cut-Extrude4 (cut, through all)
    with BuildSketch(Plane.XY.offset(90)):
        with Locations((-30, -112)):
            Circle(SKETCH5_R)
        with Locations((-12, -112)):
            Circle(SKETCH5_R_2)
        with Locations((-48, -112)):
            Circle(SKETCH5_R_2)
    extrude(amount=-CUT_EXTRUDE4_DEPTH, mode=Mode.SUBTRACT)

    # Sketch6 → Cut-Extrude5 (cut, up to next)
    with BuildSketch(Plane(origin=(0, 0, 0), x_dir=(-1, 0, 0), z_dir=(0, 0, -1)), mode=Mode.PRIVATE) as cut_extrude5_sk1:
        with Locations((15, -40)):
            Rectangle(SKETCH6_W, SKETCH6_H)
    cut_extrude5_tool1 = extrude(cut_extrude5_sk1.sketch, amount=-CUT_EXTRUDE5_REACH, mode=Mode.PRIVATE) & part.part
    add(cut_extrude5_tool1.solids().sort_by_distance((-15, -40, 0))[0], mode=Mode.SUBTRACT)


solid = part.part
